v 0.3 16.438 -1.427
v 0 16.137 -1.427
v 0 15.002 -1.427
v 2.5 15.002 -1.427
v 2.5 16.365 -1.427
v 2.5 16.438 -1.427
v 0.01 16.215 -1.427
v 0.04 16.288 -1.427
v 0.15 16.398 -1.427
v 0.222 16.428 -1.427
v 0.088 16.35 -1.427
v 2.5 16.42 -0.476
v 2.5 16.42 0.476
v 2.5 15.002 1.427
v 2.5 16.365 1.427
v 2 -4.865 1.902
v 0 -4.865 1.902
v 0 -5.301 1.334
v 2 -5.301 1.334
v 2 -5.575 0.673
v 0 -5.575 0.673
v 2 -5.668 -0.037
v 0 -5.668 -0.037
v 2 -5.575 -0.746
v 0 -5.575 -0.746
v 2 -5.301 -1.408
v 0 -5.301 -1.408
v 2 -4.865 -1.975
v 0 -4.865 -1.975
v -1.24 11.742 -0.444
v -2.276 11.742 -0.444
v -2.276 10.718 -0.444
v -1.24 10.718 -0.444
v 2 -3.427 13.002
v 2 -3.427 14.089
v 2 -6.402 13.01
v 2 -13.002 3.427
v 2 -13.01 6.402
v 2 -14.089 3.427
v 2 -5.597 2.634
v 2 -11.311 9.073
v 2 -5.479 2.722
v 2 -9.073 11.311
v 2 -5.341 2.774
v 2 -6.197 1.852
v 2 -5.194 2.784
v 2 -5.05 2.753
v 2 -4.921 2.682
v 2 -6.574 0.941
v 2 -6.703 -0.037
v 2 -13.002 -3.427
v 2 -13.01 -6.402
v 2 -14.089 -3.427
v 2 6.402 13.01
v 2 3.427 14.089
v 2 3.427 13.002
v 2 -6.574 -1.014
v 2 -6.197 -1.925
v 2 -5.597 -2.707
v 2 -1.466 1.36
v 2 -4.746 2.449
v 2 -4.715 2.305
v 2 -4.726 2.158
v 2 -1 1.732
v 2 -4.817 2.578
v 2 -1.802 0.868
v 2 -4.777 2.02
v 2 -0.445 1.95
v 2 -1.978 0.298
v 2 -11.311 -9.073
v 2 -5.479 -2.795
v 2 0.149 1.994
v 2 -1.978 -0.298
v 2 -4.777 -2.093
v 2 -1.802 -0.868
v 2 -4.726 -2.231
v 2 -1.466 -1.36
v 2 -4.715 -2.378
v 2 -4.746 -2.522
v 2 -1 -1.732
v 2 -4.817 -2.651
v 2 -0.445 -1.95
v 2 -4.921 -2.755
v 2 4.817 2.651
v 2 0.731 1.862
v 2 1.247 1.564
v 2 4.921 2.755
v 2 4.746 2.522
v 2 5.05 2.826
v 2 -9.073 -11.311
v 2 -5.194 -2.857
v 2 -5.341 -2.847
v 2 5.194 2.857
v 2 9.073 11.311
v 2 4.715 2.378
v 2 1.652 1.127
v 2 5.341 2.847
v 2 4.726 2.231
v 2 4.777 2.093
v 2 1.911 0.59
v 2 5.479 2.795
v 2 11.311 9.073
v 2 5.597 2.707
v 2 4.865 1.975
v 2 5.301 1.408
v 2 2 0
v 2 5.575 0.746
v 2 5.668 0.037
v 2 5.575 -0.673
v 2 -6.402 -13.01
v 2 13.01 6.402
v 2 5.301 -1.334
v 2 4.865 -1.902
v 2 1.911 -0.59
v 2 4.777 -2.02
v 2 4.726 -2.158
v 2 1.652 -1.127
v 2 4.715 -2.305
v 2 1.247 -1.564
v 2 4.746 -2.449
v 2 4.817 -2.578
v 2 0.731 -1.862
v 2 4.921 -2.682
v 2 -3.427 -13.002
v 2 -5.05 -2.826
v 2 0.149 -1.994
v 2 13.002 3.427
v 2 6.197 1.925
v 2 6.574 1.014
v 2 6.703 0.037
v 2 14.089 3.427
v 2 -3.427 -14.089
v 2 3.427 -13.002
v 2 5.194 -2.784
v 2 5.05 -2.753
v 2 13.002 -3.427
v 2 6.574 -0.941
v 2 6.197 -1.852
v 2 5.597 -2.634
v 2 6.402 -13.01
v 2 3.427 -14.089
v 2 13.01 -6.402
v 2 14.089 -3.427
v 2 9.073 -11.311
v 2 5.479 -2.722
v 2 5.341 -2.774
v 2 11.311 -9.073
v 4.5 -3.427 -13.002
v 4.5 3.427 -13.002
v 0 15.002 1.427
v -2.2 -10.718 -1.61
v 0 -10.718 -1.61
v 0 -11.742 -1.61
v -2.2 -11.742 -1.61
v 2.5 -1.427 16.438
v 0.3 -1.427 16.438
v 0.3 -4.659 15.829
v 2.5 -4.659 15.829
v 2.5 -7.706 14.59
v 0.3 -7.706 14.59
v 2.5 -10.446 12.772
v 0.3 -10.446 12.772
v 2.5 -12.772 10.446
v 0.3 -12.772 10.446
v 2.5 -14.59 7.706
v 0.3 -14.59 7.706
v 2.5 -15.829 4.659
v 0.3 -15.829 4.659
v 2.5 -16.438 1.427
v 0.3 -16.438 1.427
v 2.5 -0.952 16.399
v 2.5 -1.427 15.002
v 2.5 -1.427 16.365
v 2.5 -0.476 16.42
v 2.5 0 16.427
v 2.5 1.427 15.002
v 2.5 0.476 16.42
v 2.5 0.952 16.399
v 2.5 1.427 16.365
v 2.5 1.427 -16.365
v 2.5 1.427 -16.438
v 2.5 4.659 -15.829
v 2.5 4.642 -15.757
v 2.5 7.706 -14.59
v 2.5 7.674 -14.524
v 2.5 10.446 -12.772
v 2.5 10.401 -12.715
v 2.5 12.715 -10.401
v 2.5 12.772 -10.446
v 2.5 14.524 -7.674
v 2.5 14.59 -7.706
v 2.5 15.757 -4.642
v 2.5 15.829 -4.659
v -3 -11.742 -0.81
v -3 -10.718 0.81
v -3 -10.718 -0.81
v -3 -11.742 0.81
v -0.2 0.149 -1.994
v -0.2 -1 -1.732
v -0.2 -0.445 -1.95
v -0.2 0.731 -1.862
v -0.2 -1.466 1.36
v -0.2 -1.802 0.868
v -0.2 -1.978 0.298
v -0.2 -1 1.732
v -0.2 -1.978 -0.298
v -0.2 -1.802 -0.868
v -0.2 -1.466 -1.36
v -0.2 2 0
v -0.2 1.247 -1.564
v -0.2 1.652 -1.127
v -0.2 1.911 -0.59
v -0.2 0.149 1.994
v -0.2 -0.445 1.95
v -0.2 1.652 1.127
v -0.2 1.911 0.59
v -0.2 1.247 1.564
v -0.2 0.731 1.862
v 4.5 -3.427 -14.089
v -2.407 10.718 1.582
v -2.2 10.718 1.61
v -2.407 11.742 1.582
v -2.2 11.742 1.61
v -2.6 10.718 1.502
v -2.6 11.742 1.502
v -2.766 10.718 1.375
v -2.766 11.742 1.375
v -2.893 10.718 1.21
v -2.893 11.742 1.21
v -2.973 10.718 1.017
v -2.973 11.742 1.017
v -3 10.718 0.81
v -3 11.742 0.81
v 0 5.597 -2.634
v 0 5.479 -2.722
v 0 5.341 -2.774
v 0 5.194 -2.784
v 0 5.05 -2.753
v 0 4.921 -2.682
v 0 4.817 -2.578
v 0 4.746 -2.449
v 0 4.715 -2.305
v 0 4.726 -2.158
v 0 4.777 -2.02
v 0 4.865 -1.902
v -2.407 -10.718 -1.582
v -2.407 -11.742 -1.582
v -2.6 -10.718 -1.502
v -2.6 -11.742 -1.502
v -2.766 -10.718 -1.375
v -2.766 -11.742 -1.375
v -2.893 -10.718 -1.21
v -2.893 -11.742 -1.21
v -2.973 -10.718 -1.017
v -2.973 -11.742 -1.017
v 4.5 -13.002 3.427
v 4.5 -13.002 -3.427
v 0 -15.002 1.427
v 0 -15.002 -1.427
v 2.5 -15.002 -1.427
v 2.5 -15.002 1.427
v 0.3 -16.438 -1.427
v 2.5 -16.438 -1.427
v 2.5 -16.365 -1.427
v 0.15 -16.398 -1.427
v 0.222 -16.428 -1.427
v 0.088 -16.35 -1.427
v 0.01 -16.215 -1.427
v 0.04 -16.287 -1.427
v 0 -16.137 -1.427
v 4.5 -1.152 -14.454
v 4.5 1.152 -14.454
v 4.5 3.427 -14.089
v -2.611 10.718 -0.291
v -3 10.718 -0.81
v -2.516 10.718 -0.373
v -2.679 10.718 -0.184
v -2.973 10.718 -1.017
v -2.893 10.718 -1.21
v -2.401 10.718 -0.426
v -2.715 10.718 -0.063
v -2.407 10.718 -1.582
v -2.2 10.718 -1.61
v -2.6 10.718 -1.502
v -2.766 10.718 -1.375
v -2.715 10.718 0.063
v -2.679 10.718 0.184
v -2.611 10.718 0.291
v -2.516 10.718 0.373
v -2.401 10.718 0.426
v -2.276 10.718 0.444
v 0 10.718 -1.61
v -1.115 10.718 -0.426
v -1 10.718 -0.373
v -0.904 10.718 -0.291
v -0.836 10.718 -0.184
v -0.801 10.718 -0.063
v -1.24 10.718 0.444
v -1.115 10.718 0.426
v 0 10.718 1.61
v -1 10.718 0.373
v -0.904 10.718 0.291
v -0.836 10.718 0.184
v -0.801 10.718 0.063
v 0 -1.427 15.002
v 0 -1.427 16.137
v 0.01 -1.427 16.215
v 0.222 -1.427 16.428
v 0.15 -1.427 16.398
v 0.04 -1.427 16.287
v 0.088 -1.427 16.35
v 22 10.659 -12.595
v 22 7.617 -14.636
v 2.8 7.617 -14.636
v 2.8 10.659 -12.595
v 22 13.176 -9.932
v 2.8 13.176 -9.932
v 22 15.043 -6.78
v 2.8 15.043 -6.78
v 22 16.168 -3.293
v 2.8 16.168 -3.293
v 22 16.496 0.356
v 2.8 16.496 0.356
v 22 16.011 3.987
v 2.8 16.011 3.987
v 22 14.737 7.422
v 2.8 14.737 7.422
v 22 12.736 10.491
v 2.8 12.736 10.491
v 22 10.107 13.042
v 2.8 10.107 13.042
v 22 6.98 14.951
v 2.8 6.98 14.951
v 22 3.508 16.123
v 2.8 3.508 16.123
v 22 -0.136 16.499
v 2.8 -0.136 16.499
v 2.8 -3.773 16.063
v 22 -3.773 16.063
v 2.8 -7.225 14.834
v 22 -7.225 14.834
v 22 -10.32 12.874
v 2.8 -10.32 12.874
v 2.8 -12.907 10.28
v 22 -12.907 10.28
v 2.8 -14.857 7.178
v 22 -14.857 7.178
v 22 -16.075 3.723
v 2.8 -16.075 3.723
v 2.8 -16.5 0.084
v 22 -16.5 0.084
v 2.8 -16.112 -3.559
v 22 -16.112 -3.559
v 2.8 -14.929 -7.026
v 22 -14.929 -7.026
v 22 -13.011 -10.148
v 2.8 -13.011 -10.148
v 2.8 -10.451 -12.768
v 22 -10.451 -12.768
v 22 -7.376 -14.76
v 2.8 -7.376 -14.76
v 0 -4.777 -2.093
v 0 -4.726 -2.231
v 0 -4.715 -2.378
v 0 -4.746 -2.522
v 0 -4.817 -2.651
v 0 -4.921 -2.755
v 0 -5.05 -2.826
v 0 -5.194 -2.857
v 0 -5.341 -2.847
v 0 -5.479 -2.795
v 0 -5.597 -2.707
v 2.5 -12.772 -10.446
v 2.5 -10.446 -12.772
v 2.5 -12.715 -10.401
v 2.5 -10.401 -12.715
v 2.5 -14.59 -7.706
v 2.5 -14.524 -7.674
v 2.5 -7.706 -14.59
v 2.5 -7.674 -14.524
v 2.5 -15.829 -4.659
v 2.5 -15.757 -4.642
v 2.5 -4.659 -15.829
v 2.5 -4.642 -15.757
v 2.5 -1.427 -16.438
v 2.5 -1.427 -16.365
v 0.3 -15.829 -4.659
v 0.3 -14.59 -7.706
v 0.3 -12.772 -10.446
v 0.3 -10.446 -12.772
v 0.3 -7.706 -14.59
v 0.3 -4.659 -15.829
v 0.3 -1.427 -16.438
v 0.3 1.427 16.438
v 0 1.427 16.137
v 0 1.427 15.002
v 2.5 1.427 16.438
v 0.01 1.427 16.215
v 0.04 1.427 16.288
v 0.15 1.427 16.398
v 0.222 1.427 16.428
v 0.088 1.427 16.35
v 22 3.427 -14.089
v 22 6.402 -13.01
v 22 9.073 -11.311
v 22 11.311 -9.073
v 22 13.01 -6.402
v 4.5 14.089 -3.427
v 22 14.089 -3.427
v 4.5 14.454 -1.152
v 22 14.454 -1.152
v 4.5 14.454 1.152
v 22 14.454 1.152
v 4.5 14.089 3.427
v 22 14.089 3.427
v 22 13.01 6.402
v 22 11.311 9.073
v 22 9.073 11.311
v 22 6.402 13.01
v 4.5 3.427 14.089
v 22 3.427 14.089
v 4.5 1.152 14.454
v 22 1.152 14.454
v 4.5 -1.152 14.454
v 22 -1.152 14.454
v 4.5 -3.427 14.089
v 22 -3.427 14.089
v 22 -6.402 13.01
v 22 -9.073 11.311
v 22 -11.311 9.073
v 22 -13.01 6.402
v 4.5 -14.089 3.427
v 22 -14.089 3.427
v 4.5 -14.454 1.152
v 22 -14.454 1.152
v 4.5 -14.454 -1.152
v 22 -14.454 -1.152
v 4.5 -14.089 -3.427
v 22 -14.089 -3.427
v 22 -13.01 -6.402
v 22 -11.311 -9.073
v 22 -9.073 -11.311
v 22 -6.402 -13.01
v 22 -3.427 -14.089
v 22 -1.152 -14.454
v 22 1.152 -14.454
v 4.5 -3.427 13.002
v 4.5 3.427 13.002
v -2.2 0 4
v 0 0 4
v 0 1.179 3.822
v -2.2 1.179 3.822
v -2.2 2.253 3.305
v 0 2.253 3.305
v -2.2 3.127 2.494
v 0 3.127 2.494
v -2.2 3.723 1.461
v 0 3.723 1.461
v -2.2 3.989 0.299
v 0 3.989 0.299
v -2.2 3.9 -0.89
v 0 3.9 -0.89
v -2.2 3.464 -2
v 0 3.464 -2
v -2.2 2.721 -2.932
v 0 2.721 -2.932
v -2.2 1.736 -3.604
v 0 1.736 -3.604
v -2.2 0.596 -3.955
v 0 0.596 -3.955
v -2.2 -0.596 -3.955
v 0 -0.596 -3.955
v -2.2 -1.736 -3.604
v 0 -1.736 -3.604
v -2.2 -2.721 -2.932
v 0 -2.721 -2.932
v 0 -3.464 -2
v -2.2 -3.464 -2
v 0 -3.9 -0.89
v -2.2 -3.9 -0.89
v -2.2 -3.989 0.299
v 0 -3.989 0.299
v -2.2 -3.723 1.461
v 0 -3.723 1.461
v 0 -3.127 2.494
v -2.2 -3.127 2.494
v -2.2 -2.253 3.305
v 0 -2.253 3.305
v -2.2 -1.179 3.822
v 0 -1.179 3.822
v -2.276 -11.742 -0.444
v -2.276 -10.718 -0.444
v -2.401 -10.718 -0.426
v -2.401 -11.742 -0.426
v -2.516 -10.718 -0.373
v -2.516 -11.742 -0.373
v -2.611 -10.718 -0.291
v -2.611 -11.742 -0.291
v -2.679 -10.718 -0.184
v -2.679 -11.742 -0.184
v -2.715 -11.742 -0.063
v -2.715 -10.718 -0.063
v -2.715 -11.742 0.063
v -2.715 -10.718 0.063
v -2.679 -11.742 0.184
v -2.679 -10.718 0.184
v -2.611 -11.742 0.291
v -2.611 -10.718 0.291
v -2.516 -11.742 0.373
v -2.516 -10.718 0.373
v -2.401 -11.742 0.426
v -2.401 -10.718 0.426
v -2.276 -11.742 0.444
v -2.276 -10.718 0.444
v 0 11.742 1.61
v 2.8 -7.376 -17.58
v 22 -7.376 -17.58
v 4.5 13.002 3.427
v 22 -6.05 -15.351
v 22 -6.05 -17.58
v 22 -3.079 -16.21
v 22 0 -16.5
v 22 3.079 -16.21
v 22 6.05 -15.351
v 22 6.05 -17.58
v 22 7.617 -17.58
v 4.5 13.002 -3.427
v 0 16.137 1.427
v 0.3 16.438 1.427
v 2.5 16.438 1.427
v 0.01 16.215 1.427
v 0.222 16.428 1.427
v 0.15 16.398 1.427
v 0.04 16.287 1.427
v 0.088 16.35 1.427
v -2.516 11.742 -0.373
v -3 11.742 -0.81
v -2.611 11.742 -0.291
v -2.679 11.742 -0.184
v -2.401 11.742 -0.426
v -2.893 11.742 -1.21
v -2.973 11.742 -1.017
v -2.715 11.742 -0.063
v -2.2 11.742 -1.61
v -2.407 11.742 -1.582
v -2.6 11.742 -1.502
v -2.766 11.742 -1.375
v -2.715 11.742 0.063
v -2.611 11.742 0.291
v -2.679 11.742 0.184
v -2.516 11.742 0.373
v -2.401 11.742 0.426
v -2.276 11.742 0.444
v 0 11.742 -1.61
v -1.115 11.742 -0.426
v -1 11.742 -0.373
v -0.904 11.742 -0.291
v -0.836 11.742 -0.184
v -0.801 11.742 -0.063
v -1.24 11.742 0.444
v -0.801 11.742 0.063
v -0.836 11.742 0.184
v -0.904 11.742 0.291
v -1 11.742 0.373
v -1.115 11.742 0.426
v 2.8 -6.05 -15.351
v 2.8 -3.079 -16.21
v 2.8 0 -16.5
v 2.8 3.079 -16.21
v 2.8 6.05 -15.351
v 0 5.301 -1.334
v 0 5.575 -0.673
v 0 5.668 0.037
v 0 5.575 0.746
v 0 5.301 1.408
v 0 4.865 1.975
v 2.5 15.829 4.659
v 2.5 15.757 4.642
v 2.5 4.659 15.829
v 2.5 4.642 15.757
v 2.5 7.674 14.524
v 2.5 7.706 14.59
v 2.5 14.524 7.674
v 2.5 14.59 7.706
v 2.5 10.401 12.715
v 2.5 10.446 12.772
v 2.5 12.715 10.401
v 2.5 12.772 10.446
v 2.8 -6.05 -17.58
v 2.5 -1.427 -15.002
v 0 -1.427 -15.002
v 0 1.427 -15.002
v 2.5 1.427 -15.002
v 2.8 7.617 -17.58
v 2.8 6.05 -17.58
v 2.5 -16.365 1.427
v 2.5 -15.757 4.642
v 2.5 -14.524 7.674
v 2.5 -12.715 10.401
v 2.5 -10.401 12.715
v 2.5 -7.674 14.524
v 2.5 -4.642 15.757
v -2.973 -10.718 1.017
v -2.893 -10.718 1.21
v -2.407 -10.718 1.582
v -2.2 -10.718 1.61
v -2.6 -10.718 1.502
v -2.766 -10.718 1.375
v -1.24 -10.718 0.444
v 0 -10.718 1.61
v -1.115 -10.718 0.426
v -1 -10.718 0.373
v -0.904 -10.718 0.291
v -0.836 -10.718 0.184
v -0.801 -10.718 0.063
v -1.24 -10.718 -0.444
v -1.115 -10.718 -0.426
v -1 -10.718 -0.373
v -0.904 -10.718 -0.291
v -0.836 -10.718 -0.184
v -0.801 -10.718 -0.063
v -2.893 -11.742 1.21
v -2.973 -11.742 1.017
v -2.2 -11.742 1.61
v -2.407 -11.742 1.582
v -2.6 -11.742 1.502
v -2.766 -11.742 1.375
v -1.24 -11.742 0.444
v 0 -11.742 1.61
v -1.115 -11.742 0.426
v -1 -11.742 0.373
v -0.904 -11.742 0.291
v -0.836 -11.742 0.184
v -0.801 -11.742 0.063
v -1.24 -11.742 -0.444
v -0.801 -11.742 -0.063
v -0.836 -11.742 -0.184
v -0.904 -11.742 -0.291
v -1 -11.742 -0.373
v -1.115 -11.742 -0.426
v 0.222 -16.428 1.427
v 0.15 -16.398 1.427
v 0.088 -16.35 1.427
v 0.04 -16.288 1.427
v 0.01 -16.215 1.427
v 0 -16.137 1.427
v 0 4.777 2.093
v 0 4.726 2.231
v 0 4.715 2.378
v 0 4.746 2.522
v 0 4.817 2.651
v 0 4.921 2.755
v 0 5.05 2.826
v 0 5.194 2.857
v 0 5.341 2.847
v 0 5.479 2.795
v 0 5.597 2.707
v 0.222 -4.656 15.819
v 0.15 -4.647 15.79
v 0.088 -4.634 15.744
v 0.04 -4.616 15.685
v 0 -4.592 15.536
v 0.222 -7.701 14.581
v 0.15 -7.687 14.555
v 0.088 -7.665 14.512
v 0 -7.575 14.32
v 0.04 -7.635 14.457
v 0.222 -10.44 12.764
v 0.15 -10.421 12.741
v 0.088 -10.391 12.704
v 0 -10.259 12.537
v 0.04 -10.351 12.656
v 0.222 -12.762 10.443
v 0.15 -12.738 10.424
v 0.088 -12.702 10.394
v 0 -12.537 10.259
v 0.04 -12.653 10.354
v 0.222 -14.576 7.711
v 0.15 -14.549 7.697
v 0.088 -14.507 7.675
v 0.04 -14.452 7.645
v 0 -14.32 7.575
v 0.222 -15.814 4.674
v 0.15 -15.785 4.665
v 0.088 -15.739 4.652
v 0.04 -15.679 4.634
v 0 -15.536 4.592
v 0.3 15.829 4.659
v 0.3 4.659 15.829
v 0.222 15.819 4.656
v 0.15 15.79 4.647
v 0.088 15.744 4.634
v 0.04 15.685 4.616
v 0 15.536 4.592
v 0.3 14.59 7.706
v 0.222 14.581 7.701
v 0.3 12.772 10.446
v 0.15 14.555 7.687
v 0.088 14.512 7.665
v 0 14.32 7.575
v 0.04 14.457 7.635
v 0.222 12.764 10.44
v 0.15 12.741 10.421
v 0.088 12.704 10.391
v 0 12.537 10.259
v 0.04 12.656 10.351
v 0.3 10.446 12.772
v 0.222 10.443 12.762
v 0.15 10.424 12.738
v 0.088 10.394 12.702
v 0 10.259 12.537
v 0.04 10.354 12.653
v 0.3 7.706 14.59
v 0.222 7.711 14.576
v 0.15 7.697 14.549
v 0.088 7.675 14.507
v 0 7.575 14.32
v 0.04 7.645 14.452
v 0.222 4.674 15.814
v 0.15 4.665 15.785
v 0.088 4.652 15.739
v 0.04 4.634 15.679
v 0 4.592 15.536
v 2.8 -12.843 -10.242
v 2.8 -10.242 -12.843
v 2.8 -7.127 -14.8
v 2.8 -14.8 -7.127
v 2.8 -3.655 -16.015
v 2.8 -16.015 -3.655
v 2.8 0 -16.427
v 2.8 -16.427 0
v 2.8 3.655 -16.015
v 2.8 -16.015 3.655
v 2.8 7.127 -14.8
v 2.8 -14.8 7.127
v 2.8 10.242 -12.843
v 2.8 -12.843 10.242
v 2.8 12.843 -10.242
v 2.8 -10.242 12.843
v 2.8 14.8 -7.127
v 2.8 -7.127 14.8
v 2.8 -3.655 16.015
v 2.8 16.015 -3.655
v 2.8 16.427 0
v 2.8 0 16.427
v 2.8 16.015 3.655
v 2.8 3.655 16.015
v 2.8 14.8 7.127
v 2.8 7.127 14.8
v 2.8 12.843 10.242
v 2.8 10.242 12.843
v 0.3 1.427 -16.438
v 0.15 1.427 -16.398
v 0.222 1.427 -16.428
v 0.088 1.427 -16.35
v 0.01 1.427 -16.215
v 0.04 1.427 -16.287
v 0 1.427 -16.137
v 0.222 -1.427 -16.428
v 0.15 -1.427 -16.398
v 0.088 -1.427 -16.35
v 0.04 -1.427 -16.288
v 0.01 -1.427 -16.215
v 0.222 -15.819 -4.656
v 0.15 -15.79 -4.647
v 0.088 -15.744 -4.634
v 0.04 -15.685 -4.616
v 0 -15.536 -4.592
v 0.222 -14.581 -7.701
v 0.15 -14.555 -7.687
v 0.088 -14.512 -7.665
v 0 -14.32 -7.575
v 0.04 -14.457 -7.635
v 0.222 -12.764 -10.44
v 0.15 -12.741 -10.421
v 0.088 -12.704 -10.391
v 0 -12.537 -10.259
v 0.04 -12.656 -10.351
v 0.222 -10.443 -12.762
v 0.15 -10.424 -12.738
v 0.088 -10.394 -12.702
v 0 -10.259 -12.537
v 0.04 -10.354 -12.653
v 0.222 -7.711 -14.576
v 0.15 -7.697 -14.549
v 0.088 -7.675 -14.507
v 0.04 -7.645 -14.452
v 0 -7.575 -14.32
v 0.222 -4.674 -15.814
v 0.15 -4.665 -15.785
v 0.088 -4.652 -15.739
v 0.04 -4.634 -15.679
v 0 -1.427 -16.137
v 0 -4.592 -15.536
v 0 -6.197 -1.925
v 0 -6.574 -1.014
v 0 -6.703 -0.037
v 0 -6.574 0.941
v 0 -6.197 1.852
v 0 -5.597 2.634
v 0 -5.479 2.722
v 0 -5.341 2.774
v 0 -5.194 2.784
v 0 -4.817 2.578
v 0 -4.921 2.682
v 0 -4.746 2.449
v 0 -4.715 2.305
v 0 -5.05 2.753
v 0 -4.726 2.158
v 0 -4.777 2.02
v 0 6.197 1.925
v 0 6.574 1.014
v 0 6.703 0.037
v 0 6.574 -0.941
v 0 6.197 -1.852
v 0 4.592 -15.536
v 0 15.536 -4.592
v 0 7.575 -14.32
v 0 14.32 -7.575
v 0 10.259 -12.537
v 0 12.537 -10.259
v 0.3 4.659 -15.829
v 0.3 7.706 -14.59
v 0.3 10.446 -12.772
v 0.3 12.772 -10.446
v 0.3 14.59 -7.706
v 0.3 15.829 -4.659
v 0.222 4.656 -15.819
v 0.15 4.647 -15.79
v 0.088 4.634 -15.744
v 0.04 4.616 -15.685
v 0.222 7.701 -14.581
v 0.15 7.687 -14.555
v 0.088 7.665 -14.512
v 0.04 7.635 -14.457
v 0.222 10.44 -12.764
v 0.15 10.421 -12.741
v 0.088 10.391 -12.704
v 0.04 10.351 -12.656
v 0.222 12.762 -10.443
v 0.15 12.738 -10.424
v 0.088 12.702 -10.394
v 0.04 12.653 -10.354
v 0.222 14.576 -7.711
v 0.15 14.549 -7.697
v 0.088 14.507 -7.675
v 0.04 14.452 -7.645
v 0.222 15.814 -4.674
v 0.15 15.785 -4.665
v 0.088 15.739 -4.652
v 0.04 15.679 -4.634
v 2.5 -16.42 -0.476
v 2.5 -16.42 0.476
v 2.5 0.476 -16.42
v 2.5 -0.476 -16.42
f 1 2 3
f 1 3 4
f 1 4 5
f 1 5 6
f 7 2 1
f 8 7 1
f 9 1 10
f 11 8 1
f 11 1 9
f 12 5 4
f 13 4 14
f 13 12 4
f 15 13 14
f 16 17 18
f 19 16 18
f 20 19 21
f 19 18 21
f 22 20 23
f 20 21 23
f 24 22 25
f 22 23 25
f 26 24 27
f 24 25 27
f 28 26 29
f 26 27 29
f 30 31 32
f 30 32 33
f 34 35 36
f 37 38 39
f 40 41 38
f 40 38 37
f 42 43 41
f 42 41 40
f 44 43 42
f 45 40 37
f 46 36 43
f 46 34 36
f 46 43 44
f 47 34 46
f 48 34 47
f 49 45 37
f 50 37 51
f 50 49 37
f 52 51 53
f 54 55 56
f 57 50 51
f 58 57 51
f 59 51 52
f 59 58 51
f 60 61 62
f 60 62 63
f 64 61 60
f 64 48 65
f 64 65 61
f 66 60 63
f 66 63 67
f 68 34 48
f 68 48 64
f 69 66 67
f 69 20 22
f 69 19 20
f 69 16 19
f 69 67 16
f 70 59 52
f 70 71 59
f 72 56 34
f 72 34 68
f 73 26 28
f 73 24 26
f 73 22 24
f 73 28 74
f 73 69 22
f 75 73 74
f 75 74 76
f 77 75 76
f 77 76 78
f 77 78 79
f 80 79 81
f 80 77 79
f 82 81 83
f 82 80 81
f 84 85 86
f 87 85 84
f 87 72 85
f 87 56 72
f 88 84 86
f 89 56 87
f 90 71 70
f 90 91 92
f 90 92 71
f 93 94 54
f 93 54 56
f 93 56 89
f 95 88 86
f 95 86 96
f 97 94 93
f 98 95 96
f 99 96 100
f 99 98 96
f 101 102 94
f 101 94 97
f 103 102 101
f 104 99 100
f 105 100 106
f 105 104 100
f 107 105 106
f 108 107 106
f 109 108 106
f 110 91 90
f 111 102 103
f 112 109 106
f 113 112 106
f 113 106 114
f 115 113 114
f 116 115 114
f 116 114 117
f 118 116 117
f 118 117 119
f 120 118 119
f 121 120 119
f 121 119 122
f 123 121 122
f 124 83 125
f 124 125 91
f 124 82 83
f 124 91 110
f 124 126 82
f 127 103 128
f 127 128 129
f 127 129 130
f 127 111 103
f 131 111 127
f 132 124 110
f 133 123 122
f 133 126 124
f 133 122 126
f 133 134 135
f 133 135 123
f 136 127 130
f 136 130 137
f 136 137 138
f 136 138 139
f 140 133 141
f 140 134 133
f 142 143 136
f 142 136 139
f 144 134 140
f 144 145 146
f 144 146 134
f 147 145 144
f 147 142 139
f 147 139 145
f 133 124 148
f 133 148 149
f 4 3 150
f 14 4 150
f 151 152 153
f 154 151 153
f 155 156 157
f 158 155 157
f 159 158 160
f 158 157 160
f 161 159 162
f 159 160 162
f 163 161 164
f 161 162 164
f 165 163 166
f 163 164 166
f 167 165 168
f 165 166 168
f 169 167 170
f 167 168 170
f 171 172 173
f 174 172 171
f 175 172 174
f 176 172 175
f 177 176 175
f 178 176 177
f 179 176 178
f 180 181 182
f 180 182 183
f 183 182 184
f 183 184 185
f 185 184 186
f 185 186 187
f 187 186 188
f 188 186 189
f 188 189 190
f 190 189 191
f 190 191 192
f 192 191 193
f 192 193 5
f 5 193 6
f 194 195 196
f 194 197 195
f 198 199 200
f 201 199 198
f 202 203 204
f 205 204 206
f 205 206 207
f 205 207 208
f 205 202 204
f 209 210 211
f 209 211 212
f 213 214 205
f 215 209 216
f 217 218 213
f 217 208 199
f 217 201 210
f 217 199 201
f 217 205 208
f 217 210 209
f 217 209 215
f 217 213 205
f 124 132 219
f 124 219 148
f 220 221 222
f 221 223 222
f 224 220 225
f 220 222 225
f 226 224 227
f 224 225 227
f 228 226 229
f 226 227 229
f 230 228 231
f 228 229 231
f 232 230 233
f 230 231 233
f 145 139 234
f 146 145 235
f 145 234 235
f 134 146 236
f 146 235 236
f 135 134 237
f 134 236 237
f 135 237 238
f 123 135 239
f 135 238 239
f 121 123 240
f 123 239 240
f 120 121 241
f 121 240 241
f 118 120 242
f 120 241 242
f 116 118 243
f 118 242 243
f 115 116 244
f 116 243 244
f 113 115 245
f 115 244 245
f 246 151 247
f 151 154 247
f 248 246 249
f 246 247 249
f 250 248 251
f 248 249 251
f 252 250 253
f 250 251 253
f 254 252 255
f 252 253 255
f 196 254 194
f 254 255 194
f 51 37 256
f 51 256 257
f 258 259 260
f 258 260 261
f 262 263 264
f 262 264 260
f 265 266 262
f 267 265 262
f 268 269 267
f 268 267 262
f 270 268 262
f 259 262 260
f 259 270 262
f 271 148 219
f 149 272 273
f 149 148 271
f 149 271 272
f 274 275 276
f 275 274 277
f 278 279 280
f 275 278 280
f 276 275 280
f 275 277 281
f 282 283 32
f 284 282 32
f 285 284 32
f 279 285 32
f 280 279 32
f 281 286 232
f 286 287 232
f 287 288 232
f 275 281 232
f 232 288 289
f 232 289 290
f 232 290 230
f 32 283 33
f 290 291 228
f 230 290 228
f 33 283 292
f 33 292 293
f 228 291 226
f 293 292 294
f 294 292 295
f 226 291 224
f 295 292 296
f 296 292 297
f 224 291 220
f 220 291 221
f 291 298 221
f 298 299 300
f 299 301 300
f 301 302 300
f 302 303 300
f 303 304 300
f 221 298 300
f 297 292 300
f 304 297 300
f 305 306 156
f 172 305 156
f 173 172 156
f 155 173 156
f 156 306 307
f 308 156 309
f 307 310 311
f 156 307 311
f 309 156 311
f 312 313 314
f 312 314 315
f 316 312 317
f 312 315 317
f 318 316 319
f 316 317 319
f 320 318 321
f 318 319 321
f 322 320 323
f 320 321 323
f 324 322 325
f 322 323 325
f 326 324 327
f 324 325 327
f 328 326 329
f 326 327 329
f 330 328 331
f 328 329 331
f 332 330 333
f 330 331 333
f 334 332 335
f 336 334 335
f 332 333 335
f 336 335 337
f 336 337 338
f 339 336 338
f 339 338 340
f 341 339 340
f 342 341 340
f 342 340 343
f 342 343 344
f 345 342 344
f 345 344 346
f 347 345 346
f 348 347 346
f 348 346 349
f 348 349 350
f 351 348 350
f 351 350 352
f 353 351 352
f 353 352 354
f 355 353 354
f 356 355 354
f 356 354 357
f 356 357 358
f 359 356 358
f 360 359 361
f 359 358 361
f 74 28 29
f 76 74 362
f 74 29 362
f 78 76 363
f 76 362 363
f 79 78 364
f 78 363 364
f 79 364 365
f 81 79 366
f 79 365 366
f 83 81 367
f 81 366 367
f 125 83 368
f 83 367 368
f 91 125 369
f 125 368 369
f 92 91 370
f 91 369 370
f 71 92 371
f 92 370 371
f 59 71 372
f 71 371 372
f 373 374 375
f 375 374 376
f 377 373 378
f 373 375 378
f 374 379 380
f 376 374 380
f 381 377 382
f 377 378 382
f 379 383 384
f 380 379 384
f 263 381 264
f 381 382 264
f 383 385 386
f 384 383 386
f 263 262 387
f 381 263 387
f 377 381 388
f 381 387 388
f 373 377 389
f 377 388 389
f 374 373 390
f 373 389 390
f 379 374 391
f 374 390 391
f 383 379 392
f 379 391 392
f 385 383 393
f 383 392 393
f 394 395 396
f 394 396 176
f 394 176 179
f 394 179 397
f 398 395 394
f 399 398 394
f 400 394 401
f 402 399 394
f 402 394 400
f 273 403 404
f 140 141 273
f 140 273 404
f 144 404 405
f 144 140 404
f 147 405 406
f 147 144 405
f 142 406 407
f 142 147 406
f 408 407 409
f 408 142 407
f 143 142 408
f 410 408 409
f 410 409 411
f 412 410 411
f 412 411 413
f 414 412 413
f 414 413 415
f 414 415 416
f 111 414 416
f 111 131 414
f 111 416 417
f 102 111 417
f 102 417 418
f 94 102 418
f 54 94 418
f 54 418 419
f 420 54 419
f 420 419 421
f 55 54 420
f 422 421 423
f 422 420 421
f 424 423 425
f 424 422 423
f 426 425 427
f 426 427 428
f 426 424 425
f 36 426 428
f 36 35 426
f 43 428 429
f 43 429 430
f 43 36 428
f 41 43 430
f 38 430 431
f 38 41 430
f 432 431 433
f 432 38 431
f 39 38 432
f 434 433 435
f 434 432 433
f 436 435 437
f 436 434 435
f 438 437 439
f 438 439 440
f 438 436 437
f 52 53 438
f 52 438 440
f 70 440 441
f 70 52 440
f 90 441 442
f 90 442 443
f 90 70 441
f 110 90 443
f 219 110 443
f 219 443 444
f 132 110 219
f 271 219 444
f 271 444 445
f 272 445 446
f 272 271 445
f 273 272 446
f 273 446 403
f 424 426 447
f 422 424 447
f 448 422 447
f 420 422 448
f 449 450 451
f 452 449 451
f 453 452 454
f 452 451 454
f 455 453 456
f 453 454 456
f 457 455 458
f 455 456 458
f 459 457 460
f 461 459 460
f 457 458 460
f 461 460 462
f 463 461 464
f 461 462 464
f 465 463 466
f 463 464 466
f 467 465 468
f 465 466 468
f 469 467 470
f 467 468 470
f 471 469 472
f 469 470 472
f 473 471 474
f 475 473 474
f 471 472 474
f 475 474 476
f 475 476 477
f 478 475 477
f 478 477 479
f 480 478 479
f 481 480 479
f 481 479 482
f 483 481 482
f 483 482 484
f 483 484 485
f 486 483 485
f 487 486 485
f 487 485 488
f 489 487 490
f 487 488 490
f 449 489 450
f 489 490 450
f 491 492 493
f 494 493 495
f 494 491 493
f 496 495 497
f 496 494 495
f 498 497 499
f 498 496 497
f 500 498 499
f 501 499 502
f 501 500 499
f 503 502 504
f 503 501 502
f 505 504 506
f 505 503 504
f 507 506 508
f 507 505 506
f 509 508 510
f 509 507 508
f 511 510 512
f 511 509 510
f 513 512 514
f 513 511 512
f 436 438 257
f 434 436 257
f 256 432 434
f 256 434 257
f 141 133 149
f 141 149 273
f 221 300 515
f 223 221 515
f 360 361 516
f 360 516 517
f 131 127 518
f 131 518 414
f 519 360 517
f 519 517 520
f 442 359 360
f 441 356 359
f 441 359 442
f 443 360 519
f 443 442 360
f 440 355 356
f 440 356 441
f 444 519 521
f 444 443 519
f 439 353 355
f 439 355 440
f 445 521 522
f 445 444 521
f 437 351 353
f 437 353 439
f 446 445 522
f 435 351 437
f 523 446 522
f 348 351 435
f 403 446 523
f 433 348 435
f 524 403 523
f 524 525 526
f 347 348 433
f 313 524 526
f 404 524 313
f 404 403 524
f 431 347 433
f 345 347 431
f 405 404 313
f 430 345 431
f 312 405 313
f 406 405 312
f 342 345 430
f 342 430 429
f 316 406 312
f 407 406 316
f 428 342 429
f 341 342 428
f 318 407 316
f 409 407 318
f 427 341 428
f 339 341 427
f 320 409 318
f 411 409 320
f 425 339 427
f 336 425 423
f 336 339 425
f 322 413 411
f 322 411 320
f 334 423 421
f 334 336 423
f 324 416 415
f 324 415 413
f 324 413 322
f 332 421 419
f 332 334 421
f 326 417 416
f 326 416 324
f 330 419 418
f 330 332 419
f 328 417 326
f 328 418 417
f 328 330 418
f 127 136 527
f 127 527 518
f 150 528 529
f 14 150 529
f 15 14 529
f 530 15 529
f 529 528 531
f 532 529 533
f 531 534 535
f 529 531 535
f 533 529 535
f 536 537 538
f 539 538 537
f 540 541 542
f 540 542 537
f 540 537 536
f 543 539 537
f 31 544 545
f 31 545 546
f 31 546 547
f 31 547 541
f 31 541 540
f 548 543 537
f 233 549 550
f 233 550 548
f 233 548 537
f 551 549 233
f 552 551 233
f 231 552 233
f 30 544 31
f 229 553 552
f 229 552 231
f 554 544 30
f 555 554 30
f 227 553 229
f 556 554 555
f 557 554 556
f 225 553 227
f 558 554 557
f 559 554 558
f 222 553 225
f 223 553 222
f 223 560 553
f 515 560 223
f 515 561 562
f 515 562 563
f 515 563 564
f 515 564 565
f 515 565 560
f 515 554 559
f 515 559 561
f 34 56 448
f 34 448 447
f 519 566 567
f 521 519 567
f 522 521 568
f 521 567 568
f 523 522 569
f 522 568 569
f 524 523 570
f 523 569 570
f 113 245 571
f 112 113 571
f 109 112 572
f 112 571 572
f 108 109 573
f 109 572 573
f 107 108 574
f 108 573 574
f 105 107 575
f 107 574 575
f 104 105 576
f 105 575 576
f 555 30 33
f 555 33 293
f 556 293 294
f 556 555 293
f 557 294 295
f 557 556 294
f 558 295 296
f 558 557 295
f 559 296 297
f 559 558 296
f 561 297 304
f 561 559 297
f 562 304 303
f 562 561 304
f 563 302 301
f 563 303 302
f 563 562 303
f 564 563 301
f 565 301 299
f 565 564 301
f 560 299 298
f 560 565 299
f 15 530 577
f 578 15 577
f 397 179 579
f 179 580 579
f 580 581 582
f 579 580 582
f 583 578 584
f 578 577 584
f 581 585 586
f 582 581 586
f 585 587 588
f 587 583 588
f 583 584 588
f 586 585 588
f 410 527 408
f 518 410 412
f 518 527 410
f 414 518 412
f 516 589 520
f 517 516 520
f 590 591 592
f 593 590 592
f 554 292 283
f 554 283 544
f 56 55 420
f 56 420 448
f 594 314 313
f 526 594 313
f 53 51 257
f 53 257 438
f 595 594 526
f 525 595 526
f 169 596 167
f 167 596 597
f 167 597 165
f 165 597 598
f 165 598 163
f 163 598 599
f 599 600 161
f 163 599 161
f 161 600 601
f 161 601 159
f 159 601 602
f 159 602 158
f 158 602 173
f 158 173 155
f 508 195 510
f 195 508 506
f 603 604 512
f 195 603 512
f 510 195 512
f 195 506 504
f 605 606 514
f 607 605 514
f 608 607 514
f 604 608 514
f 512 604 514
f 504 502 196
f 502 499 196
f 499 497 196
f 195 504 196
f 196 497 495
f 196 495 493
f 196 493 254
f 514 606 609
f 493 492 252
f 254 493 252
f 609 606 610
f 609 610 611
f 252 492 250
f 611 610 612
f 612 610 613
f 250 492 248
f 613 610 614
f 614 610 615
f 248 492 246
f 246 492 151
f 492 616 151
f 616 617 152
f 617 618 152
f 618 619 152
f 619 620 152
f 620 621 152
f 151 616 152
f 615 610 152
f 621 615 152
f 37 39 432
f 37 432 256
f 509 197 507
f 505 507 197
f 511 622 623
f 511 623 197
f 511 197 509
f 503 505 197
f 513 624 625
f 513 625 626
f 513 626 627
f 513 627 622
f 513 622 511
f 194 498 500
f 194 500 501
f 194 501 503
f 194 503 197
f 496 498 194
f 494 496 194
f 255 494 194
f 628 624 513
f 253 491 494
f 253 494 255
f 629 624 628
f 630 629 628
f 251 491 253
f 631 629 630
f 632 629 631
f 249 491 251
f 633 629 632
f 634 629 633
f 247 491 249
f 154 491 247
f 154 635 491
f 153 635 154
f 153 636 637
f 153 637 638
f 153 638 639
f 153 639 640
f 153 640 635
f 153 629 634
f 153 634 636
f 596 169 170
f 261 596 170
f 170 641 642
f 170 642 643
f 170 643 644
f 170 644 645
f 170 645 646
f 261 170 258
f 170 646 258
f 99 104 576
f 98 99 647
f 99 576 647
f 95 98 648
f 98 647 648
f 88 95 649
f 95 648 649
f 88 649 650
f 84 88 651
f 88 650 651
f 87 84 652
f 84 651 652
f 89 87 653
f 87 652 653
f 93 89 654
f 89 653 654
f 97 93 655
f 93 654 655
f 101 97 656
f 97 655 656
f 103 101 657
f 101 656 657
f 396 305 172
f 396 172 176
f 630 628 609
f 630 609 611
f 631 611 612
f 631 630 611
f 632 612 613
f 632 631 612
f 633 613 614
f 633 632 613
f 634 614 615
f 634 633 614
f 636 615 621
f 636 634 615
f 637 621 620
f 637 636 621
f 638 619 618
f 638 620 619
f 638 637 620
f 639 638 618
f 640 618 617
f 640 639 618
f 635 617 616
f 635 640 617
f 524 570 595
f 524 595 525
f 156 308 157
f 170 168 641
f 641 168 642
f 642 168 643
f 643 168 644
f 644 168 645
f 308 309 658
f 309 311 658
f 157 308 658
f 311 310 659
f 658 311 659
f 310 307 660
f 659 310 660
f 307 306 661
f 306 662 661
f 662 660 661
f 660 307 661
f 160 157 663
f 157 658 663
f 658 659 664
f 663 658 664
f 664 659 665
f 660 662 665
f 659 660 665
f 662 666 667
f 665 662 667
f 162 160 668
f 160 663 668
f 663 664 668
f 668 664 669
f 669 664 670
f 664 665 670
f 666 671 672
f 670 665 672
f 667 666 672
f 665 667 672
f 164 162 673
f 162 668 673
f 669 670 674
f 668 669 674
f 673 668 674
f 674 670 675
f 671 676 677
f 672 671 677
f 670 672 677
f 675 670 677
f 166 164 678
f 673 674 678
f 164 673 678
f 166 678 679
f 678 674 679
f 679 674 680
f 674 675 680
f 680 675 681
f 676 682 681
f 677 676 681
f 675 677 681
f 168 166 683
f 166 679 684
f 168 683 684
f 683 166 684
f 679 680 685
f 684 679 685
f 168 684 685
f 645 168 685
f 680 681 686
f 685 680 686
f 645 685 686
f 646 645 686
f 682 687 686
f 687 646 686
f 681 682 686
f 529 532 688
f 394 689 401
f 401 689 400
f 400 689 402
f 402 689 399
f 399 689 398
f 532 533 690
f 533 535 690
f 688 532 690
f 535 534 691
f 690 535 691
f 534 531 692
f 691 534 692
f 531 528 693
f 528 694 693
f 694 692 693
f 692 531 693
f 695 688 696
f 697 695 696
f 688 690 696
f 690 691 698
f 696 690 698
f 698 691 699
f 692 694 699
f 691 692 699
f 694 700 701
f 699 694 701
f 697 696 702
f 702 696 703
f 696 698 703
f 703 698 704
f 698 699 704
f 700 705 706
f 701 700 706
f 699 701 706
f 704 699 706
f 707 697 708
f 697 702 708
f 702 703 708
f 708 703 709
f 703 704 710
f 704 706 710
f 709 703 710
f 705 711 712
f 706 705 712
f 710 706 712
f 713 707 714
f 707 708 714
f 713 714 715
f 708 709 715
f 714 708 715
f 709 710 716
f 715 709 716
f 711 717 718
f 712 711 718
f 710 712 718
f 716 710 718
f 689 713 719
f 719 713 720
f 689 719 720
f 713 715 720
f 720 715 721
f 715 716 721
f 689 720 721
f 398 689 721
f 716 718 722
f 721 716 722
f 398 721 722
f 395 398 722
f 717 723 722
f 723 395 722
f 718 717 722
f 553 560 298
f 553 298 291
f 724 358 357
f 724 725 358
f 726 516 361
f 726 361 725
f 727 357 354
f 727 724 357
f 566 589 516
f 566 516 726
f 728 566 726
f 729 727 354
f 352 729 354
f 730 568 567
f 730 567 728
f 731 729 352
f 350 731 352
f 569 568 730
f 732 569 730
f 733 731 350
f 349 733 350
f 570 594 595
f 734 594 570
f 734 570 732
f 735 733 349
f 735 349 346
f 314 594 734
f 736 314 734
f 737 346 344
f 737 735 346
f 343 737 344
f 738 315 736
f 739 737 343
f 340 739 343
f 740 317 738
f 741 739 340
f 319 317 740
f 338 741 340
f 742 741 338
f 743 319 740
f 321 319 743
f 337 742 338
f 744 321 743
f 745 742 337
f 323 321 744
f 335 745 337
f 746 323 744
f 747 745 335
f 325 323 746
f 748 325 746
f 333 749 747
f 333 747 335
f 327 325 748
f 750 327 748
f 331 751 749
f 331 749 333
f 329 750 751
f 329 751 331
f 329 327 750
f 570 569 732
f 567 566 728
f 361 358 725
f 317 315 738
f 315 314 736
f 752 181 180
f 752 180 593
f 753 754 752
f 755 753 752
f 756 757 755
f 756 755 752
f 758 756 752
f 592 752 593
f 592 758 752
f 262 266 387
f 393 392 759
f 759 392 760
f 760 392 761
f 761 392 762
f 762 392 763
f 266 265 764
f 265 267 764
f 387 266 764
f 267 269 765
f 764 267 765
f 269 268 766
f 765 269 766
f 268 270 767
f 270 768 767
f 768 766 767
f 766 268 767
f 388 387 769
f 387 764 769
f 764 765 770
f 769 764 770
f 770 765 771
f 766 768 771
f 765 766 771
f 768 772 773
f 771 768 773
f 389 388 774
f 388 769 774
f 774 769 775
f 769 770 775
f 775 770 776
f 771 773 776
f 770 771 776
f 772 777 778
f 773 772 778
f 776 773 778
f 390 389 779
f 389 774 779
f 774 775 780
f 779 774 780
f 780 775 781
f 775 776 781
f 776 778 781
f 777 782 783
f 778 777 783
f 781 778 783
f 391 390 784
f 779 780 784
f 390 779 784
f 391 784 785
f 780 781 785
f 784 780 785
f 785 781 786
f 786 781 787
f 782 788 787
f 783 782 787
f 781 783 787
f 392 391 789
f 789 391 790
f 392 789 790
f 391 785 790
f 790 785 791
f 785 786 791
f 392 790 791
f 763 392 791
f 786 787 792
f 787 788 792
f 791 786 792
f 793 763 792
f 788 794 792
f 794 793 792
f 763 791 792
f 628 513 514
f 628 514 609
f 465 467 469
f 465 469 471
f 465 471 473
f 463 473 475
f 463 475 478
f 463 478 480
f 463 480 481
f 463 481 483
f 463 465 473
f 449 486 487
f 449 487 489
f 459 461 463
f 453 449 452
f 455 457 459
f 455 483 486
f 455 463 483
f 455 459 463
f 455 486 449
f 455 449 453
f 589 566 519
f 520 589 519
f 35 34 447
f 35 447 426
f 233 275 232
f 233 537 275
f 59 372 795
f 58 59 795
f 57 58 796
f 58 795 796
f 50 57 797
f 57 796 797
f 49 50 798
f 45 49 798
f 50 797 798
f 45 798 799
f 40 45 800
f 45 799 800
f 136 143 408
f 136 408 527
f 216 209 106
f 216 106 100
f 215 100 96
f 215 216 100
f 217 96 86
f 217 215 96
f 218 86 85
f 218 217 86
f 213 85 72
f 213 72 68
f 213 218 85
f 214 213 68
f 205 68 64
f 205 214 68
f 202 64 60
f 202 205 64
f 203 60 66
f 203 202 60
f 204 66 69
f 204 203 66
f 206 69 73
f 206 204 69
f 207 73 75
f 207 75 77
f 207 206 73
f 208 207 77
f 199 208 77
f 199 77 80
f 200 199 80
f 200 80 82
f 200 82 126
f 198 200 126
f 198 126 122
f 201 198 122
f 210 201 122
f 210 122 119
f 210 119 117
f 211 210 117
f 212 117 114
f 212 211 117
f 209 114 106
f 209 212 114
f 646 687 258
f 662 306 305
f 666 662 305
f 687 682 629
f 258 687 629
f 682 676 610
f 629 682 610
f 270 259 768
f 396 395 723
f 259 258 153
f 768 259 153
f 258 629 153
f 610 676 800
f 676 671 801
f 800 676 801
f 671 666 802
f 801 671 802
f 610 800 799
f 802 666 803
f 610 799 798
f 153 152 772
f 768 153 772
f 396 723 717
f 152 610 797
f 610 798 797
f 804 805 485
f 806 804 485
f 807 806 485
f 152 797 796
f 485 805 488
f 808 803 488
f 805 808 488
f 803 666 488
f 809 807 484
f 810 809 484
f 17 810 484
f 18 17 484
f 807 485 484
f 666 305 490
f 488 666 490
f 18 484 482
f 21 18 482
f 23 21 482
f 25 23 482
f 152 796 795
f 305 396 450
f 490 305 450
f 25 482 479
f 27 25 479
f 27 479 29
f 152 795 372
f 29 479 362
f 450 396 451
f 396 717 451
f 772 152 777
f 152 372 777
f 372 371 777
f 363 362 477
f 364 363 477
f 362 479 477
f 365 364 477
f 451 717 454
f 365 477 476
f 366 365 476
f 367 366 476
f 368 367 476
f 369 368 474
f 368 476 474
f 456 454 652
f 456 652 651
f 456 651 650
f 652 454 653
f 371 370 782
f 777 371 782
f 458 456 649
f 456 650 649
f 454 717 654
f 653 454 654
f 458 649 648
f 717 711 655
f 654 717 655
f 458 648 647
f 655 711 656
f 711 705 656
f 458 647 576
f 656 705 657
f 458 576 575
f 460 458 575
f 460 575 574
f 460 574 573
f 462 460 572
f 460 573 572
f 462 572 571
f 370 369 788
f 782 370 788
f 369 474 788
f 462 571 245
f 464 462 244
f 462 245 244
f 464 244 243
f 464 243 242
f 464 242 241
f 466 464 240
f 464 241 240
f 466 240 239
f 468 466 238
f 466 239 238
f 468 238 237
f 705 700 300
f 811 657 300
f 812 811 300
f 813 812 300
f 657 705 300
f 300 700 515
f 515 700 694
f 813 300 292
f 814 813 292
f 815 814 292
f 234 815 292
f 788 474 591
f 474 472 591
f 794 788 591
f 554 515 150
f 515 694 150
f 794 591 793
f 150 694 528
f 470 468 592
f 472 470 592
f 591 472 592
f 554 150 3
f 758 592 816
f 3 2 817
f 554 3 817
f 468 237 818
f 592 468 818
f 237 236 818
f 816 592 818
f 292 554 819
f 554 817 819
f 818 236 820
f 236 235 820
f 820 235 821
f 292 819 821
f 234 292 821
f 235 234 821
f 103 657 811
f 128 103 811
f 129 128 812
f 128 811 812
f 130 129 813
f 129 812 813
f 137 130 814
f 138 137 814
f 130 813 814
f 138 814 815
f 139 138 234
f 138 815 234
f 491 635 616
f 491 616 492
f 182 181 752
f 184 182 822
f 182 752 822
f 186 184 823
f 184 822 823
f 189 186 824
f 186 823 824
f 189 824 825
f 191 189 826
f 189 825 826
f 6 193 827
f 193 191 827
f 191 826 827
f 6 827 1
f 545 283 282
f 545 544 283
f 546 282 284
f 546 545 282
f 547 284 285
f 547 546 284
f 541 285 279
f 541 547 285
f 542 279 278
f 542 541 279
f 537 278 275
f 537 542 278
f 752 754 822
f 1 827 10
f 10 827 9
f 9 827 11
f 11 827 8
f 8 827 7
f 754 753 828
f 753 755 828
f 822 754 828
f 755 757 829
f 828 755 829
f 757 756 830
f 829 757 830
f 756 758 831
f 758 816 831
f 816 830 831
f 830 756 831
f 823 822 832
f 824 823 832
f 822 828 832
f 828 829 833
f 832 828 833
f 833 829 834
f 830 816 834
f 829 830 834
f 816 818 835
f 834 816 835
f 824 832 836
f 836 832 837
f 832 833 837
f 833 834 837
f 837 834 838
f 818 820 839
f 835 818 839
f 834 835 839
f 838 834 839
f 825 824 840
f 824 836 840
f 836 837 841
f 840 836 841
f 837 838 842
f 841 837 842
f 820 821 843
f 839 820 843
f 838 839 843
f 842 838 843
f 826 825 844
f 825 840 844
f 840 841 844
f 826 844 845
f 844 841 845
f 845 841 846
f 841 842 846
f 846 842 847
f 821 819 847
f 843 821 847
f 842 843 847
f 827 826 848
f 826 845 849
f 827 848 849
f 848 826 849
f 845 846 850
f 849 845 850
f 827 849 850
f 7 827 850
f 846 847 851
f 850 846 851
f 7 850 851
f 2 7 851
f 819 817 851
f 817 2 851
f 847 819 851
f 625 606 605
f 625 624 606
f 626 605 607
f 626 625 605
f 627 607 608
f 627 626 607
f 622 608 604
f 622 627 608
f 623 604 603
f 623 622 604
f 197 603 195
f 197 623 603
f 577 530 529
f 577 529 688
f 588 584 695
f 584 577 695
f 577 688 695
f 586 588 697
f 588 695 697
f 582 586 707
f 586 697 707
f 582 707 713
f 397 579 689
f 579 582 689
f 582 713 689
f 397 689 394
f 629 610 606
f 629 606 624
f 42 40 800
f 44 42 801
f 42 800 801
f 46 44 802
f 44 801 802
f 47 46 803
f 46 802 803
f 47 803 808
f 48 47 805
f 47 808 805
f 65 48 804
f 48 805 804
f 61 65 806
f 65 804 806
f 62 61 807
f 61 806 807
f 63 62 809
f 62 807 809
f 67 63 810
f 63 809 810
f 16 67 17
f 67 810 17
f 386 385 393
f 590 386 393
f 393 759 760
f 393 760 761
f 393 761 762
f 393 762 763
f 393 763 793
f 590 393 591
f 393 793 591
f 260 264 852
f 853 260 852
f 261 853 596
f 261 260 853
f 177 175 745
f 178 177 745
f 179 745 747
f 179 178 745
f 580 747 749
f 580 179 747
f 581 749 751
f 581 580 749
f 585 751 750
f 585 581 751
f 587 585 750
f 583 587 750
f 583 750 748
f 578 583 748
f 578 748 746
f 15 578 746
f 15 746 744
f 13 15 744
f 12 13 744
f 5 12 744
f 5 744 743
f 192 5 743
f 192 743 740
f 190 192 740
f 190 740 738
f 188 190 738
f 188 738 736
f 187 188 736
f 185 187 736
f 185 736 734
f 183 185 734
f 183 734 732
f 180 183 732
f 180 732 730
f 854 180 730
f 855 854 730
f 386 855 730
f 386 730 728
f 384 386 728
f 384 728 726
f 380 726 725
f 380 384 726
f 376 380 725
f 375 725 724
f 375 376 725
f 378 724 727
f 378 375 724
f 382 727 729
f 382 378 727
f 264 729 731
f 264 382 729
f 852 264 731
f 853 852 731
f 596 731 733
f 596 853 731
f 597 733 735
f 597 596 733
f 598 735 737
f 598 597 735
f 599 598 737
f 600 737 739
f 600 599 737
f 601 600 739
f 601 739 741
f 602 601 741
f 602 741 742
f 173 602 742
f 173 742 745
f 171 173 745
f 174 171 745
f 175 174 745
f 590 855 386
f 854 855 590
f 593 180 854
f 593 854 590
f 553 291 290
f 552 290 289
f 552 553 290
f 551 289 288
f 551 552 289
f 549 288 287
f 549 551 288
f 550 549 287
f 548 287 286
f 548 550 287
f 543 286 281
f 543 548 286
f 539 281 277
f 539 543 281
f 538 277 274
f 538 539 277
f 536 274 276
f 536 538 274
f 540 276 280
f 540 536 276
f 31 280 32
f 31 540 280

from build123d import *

# Parameters (mm, degrees)
SKETCH1_R           = 16.5
BOSS_EXTRUDE1_DEPTH = 22
SKETCH2_W           = 2.99551857
SKETCH2_H           = 2.853303302
SKETCH2_W_2         = 2.853303302
SKETCH2_H_2         = 2.99551857
CUT_EXTRUDE1_DEPTH  = 2.5
SKETCH3_R           = 4
BOSS_EXTRUDE2_DEPTH = 2.2
CUT_EXTRUDE2_DEPTH  = 12.2
SKETCH5_W           = 3.219111416
SKETCH5_H           = 1.024262723
BOSS_EXTRUDE3_DEPTH = 3
CUT_EXTRUDE3_DEPTH  = 3
CIRPATTERN2_COUNT   = 2
SHELL1_START        = 2
SHELL1_DEPTH        = 20
SHELL1_START_2      = 14.2
SHELL1_2_DEPTH      = 7.8
SHELL1_START_3      = 4.5
SHELL1_3_DEPTH      = 9.7
SHELL1_START_4      = -0.2
SHELL1_4_OUTLINE_R  = 2
SHELL1_4_DEPTH      = 2.2
SKETCH7_R           = 9.780494134
CUT_EXTRUDE4_DEPTH  = 28
SKETCH8_R           = 16.5
SKETCH8_R_2         = 16.427034369
CUT_EXTRUDE5_DEPTH  = 0.3
FILLET1_R           = 0.3
FILLET2_R           = 0.8
SKETCH9_W           = 19.2
SKETCH9_H           = 1.567367832
SKETCH9_H_2         = 1.325546631
BOSS_EXTRUDE4_DEPTH = 3


# Read off the part's stored shape, not the designer's step: Shell1
with BuildPart() as part:
    # Sketch1 → Boss-Extrude1 (new body)
    with BuildSketch(Plane(origin=(0, 0, 0), x_dir=(0, 0, -1), z_dir=(1, 0, 0))):
        Circle(SKETCH1_R)
    extrude(amount=BOSS_EXTRUDE1_DEPTH)

    # Sketch2 → Cut-Extrude1 (cut)
    with BuildSketch(Plane.ZY):
        with Locations((-16.5, 0)):
            Rectangle(SKETCH2_W, SKETCH2_H)
        with Locations((0, 16.5)):
            Rectangle(SKETCH2_W_2, SKETCH2_H_2)
        with Locations((16.5, 0)):
            Rectangle(SKETCH2_W, SKETCH2_H)
        with Locations((0, -16.5)):
            Rectangle(SKETCH2_W_2, SKETCH2_H_2)
    extrude(amount=-CUT_EXTRUDE1_DEPTH, mode=Mode.SUBTRACT)

    # Sketch3 → Boss-Extrude2 (add)
    with BuildSketch(Plane.ZY):
        Circle(SKETCH3_R)
    extrude(amount=BOSS_EXTRUDE2_DEPTH)

    # Sketch4 → Cut-Extrude2 (cut)
    with BuildSketch(Plane.ZY):
        with BuildLine():
            ThreePointArc((2.706980055, 5.596864168), (0.036580812, 6.702979752), (-2.633818432, 5.596864168))
            ThreePointArc((-2.633818432, 5.596864168), (-2.633818432, 4.865247937), (-1.902202201, 4.865247937))
            ThreePointArc((-1.902202201, 4.865247937), (0.036580812, 5.668318155), (1.975363824, 4.865247937))
            ThreePointArc((1.975363824, 4.865247937), (2.706980055, 4.865247937), (2.706980055, 5.596864168))
        make_face()
        with BuildLine():
            ThreePointArc((-2.706980055, -5.596864168), (-0.036580812, -6.702979752), (2.633818432, -5.596864168))
            ThreePointArc((2.633818432, -5.596864168), (2.633818432, -4.865247937), (1.902202201, -4.865247937))
            ThreePointArc((1.902202201, -4.865247937), (-0.036580812, -5.668318155), (-1.975363824, -4.865247937))
            ThreePointArc((-1.975363824, -4.865247937), (-2.706980055, -4.865247937), (-2.706980055, -5.596864168))
        make_face()
    extrude(amount=-CUT_EXTRUDE2_DEPTH, mode=Mode.SUBTRACT)

    # Sketch5 → Boss-Extrude3 (add)
    with BuildSketch(Plane.ZY):
        with Locations((0, 11.230309148)):
            Rectangle(SKETCH5_W, SKETCH5_H)
    boss_extrude3 = extrude(amount=BOSS_EXTRUDE3_DEPTH)

    # Sketch6 → Cut-Extrude3 (cut)
    with BuildSketch(Plane(origin=(0, 11.742440509, 0), x_dir=(1, 0, 0), z_dir=(0, 1, 0))):
        with BuildLine():
            Line((-1.239883538, -0.443858464), (-2.275602474, -0.443858464))
            ThreePointArc((-2.275602474, -0.443858464), (-2.719460937, 0), (-2.275602474, 0.443858464))
            Line((-2.275602474, 0.443858464), (-1.239883538, 0.443858464))
            ThreePointArc((-1.239883538, 0.443858464), (-0.796025074, 0), (-1.239883538, -0.443858464))
        make_face()
    cut_extrude3 = extrude(amount=-CUT_EXTRUDE3_DEPTH, mode=Mode.SUBTRACT)

    # CirPattern2: Boss-Extrude3, Cut-Extrude3 ×2 about axis
    cirpattern2_axis = Axis((0, 0, 0), (1, 0, 0))
    add([boss_extrude3.rotate(cirpattern2_axis, i * 360 / CIRPATTERN2_COUNT) for i in range(1, CIRPATTERN2_COUNT)])
    add([cut_extrude3.rotate(cirpattern2_axis, i * 360 / CIRPATTERN2_COUNT) for i in range(1, CIRPATTERN2_COUNT)], mode=Mode.SUBTRACT)

    # Shell1 outline → Shell1 (cut)
    with BuildSketch(Plane.YZ.offset(SHELL1_START)):
        with BuildLine():
            Line((13.002240715, 3.426651651), (14.089288785, 3.426651651))
            ThreePointArc((14.089288785, 3.426651651), (10.253048327, 10.253048327), (3.426651651, 14.089288785))
            Line((3.426651651, 14.089288785), (3.426651651, 13.002240715))
            Line((3.426651651, 13.002240715), (-3.426651651, 13.002240715))
            Line((-3.426651651, 13.002240715), (-3.426651651, 14.089288785))
            ThreePointArc((-3.426651651, 14.089288785), (-10.253048327, 10.253048327), (-14.089288785, 3.426651651))
            Line((-14.089288785, 3.426651651), (-13.002240715, 3.426651651))
            Line((-13.002240715, 3.426651651), (-13.002240715, -3.426651651))
            Line((-13.002240715, -3.426651651), (-14.089288785, -3.426651651))
            ThreePointArc((-14.089288785, -3.426651651), (-10.253048327, -10.253048327), (-3.426651651, -14.089288785))
            Line((-3.426651651, -14.089288785), (-3.426651651, -13.002240715))
            Line((-3.426651651, -13.002240715), (3.426651651, -13.002240715))
            Line((3.426651651, -13.002240715), (3.426651651, -14.089288785))
            ThreePointArc((3.426651651, -14.089288785), (10.253048327, -10.253048327), (14.089288785, -3.426651651))
            Line((14.089288785, -3.426651651), (13.002240715, -3.426651651))
            Line((13.002240715, -3.426651651), (13.002240715, 3.426651651))
        make_face()
        with BuildLine():
            ThreePointArc((-3.451034375, 0.487988639), (-3.668318155, -0.036580811), (-3.451034375, -0.561150262))
            ThreePointArc((-3.451034375, -0.561150262), (-3.451034375, -4.121193617), (-7.01107773, -4.121193617))
            ThreePointArc((-7.01107773, -4.121193617), (-8.702979752, -0.036580811), (-7.01107773, 4.048031994))
            ThreePointArc((-7.01107773, 4.048031994), (-3.451034375, 4.048031994), (-3.451034375, 0.487988639))
        make_face(mode=Mode.SUBTRACT)
        with BuildLine():
            ThreePointArc((3.451034375, -0.487988639), (3.668318155, 0.036580811), (3.451034375, 0.561150262))
            ThreePointArc((3.451034375, 0.561150262), (3.451034375, 4.121193617), (7.01107773, 4.121193617))
            ThreePointArc((7.01107773, 4.121193617), (8.702979752, 0.036580811), (7.01107773, -4.048031994))
            ThreePointArc((7.01107773, -4.048031994), (3.451034375, -4.048031994), (3.451034375, -0.487988639))
        make_face(mode=Mode.SUBTRACT)
    extrude(amount=SHELL1_DEPTH, mode=Mode.SUBTRACT)

    # Shell1 2 outline → Shell1 2 (cut)
    with BuildSketch(Plane.YZ.offset(SHELL1_START_2)):
        with BuildLine():
            ThreePointArc((14.089288785, -3.426651651), (14.5, 0), (14.089288785, 3.426651651))
            Line((14.089288785, 3.426651651), (13.002240715, 3.426651651))
            Line((13.002240715, 3.426651651), (13.002240715, -3.426651651))
            Line((13.002240715, -3.426651651), (14.089288785, -3.426651651))
        make_face()
        with BuildLine():
            Line((3.426651651, 13.002240715), (3.426651651, 14.089288785))
            ThreePointArc((3.426651651, 14.089288785), (0, 14.5), (-3.426651651, 14.089288785))
            Line((-3.426651651, 14.089288785), (-3.426651651, 13.002240715))
            Line((-3.426651651, 13.002240715), (3.426651651, 13.002240715))
        make_face()
        with BuildLine():
            ThreePointArc((-3.426651651, -14.089288785), (0, -14.5), (3.426651651, -14.089288785))
            Line((3.426651651, -14.089288785), (3.426651651, -13.002240715))
            Line((3.426651651, -13.002240715), (-3.426651651, -13.002240715))
            Line((-3.426651651, -13.002240715), (-3.426651651, -14.089288785))
        make_face()
        with BuildLine():
            Line((-13.002240715, 3.426651651), (-14.089288785, 3.426651651))
            ThreePointArc((-14.089288785, 3.426651651), (-14.5, 0), (-14.089288785, -3.426651651))
            Line((-14.089288785, -3.426651651), (-13.002240715, -3.426651651))
            Line((-13.002240715, -3.426651651), (-13.002240715, 3.426651651))
        make_face()
        with BuildLine():
            ThreePointArc((-7.01107773, -4.121193617), (-3.451034375, -4.121193617), (-3.451034375, -0.561150262))
            ThreePointArc((-3.451034375, -0.561150262), (-3.668318155, -0.036580811), (-3.451034375, 0.487988639))
            ThreePointArc((-3.451034375, 0.487988639), (-3.451034375, 4.048031994), (-7.01107773, 4.048031994))
            ThreePointArc((-7.01107773, 4.048031994), (-8.702979752, -0.036580811), (-7.01107773, -4.121193617))
        make_face()
        with BuildLine():
            ThreePointArc((7.01107773, 4.121193617), (3.451034375, 4.121193617), (3.451034375, 0.561150262))
            ThreePointArc((3.451034375, 0.561150262), (3.668318155, 0.036580811), (3.451034375, -0.487988639))
            ThreePointArc((3.451034375, -0.487988639), (3.451034375, -4.048031994), (7.01107773, -4.048031994))
            ThreePointArc((7.01107773, -4.048031994), (8.702979752, 0.036580811), (7.01107773, 4.121193617))
        make_face()
    extrude(amount=SHELL1_2_DEPTH, mode=Mode.SUBTRACT)

    # Shell1 3 outline → Shell1 3 (cut)
    with BuildSketch(Plane.YZ.offset(SHELL1_START_3)):
        with BuildLine():
            ThreePointArc((14.089288785, -3.426651651), (14.5, 0), (14.089288785, 3.426651651))
            Line((14.089288785, 3.426651651), (13.002240715, 3.426651651))
            Line((13.002240715, 3.426651651), (13.002240715, -3.426651651))
            Line((13.002240715, -3.426651651), (14.089288785, -3.426651651))
        make_face()
        with BuildLine():
            Line((3.426651651, 13.002240715), (3.426651651, 14.089288785))
            ThreePointArc((3.426651651, 14.089288785), (0, 14.5), (-3.426651651, 14.089288785))
            Line((-3.426651651, 14.089288785), (-3.426651651, 13.002240715))
            Line((-3.426651651, 13.002240715), (3.426651651, 13.002240715))
        make_face()
        with BuildLine():
            ThreePointArc((-3.426651651, -14.089288785), (0, -14.5), (3.426651651, -14.089288785))
            Line((3.426651651, -14.089288785), (3.426651651, -13.002240715))
            Line((3.426651651, -13.002240715), (-3.426651651, -13.002240715))
            Line((-3.426651651, -13.002240715), (-3.426651651, -14.089288785))
        make_face()
        with BuildLine():
            Line((-13.002240715, 3.426651651), (-14.089288785, 3.426651651))
            ThreePointArc((-14.089288785, 3.426651651), (-14.5, 0), (-14.089288785, -3.426651651))
            Line((-14.089288785, -3.426651651), (-13.002240715, -3.426651651))
            Line((-13.002240715, -3.426651651), (-13.002240715, 3.426651651))
        make_face()
    extrude(amount=SHELL1_3_DEPTH, mode=Mode.SUBTRACT)

    # Shell1 4 outline → Shell1 4 (cut)
    with BuildSketch(Plane.YZ.offset(SHELL1_START_4)):
        Circle(SHELL1_4_OUTLINE_R)
    extrude(amount=SHELL1_4_DEPTH, mode=Mode.SUBTRACT)

    # Sketch7 → Cut-Extrude4 (cut)
    with BuildSketch(Plane(origin=(2, 0, 0), x_dir=(0, 0, -1), z_dir=(1, 0, 0))):
        Circle(SKETCH7_R)
    extrude(amount=CUT_EXTRUDE4_DEPTH, mode=Mode.SUBTRACT)

    # Sketch8 → Cut-Extrude5 (cut)
    with BuildSketch(Plane.ZY.offset(-2.5)):
        Circle(SKETCH8_R)
        Circle(SKETCH8_R_2, mode=Mode.SUBTRACT)
    extrude(amount=-CUT_EXTRUDE5_DEPTH, mode=Mode.SUBTRACT)

    # Fillet1
    fillet1_edges = [part.edges().sort_by_distance(p)[0] for p in [
        (0, 11.66726189, -11.66726189),
        (0, 11.66726189, 11.66726189),
        (0, -11.66726189, 11.66726189),
        (0, -11.66726189, -11.66726189),
    ]]
    fillet(fillet1_edges, radius=FILLET1_R)

    # Fillet2
    fillet2_edges = [part.edges().sort_by_distance(p)[0] for p in [
        (-3, 11.230309148, 1.609555708),
        (-3, 11.230309148, -1.609555708),
        (-3, -11.230309148, -1.609555708),
        (-3, -11.230309148, 1.609555708),
    ]]
    fillet(fillet2_edges, radius=FILLET2_R)

    # Sketch9 → Boss-Extrude4 (add)
    with BuildSketch(Plane.XY.offset(-14.58)):
        with Locations((12.4, 6.833683916)):
            Rectangle(SKETCH9_W, SKETCH9_H)
        with Locations((12.4, -6.712773316)):
            Rectangle(SKETCH9_W, SKETCH9_H_2)
    extrude(amount=-BOSS_EXTRUDE4_DEPTH)


solid = part.part
